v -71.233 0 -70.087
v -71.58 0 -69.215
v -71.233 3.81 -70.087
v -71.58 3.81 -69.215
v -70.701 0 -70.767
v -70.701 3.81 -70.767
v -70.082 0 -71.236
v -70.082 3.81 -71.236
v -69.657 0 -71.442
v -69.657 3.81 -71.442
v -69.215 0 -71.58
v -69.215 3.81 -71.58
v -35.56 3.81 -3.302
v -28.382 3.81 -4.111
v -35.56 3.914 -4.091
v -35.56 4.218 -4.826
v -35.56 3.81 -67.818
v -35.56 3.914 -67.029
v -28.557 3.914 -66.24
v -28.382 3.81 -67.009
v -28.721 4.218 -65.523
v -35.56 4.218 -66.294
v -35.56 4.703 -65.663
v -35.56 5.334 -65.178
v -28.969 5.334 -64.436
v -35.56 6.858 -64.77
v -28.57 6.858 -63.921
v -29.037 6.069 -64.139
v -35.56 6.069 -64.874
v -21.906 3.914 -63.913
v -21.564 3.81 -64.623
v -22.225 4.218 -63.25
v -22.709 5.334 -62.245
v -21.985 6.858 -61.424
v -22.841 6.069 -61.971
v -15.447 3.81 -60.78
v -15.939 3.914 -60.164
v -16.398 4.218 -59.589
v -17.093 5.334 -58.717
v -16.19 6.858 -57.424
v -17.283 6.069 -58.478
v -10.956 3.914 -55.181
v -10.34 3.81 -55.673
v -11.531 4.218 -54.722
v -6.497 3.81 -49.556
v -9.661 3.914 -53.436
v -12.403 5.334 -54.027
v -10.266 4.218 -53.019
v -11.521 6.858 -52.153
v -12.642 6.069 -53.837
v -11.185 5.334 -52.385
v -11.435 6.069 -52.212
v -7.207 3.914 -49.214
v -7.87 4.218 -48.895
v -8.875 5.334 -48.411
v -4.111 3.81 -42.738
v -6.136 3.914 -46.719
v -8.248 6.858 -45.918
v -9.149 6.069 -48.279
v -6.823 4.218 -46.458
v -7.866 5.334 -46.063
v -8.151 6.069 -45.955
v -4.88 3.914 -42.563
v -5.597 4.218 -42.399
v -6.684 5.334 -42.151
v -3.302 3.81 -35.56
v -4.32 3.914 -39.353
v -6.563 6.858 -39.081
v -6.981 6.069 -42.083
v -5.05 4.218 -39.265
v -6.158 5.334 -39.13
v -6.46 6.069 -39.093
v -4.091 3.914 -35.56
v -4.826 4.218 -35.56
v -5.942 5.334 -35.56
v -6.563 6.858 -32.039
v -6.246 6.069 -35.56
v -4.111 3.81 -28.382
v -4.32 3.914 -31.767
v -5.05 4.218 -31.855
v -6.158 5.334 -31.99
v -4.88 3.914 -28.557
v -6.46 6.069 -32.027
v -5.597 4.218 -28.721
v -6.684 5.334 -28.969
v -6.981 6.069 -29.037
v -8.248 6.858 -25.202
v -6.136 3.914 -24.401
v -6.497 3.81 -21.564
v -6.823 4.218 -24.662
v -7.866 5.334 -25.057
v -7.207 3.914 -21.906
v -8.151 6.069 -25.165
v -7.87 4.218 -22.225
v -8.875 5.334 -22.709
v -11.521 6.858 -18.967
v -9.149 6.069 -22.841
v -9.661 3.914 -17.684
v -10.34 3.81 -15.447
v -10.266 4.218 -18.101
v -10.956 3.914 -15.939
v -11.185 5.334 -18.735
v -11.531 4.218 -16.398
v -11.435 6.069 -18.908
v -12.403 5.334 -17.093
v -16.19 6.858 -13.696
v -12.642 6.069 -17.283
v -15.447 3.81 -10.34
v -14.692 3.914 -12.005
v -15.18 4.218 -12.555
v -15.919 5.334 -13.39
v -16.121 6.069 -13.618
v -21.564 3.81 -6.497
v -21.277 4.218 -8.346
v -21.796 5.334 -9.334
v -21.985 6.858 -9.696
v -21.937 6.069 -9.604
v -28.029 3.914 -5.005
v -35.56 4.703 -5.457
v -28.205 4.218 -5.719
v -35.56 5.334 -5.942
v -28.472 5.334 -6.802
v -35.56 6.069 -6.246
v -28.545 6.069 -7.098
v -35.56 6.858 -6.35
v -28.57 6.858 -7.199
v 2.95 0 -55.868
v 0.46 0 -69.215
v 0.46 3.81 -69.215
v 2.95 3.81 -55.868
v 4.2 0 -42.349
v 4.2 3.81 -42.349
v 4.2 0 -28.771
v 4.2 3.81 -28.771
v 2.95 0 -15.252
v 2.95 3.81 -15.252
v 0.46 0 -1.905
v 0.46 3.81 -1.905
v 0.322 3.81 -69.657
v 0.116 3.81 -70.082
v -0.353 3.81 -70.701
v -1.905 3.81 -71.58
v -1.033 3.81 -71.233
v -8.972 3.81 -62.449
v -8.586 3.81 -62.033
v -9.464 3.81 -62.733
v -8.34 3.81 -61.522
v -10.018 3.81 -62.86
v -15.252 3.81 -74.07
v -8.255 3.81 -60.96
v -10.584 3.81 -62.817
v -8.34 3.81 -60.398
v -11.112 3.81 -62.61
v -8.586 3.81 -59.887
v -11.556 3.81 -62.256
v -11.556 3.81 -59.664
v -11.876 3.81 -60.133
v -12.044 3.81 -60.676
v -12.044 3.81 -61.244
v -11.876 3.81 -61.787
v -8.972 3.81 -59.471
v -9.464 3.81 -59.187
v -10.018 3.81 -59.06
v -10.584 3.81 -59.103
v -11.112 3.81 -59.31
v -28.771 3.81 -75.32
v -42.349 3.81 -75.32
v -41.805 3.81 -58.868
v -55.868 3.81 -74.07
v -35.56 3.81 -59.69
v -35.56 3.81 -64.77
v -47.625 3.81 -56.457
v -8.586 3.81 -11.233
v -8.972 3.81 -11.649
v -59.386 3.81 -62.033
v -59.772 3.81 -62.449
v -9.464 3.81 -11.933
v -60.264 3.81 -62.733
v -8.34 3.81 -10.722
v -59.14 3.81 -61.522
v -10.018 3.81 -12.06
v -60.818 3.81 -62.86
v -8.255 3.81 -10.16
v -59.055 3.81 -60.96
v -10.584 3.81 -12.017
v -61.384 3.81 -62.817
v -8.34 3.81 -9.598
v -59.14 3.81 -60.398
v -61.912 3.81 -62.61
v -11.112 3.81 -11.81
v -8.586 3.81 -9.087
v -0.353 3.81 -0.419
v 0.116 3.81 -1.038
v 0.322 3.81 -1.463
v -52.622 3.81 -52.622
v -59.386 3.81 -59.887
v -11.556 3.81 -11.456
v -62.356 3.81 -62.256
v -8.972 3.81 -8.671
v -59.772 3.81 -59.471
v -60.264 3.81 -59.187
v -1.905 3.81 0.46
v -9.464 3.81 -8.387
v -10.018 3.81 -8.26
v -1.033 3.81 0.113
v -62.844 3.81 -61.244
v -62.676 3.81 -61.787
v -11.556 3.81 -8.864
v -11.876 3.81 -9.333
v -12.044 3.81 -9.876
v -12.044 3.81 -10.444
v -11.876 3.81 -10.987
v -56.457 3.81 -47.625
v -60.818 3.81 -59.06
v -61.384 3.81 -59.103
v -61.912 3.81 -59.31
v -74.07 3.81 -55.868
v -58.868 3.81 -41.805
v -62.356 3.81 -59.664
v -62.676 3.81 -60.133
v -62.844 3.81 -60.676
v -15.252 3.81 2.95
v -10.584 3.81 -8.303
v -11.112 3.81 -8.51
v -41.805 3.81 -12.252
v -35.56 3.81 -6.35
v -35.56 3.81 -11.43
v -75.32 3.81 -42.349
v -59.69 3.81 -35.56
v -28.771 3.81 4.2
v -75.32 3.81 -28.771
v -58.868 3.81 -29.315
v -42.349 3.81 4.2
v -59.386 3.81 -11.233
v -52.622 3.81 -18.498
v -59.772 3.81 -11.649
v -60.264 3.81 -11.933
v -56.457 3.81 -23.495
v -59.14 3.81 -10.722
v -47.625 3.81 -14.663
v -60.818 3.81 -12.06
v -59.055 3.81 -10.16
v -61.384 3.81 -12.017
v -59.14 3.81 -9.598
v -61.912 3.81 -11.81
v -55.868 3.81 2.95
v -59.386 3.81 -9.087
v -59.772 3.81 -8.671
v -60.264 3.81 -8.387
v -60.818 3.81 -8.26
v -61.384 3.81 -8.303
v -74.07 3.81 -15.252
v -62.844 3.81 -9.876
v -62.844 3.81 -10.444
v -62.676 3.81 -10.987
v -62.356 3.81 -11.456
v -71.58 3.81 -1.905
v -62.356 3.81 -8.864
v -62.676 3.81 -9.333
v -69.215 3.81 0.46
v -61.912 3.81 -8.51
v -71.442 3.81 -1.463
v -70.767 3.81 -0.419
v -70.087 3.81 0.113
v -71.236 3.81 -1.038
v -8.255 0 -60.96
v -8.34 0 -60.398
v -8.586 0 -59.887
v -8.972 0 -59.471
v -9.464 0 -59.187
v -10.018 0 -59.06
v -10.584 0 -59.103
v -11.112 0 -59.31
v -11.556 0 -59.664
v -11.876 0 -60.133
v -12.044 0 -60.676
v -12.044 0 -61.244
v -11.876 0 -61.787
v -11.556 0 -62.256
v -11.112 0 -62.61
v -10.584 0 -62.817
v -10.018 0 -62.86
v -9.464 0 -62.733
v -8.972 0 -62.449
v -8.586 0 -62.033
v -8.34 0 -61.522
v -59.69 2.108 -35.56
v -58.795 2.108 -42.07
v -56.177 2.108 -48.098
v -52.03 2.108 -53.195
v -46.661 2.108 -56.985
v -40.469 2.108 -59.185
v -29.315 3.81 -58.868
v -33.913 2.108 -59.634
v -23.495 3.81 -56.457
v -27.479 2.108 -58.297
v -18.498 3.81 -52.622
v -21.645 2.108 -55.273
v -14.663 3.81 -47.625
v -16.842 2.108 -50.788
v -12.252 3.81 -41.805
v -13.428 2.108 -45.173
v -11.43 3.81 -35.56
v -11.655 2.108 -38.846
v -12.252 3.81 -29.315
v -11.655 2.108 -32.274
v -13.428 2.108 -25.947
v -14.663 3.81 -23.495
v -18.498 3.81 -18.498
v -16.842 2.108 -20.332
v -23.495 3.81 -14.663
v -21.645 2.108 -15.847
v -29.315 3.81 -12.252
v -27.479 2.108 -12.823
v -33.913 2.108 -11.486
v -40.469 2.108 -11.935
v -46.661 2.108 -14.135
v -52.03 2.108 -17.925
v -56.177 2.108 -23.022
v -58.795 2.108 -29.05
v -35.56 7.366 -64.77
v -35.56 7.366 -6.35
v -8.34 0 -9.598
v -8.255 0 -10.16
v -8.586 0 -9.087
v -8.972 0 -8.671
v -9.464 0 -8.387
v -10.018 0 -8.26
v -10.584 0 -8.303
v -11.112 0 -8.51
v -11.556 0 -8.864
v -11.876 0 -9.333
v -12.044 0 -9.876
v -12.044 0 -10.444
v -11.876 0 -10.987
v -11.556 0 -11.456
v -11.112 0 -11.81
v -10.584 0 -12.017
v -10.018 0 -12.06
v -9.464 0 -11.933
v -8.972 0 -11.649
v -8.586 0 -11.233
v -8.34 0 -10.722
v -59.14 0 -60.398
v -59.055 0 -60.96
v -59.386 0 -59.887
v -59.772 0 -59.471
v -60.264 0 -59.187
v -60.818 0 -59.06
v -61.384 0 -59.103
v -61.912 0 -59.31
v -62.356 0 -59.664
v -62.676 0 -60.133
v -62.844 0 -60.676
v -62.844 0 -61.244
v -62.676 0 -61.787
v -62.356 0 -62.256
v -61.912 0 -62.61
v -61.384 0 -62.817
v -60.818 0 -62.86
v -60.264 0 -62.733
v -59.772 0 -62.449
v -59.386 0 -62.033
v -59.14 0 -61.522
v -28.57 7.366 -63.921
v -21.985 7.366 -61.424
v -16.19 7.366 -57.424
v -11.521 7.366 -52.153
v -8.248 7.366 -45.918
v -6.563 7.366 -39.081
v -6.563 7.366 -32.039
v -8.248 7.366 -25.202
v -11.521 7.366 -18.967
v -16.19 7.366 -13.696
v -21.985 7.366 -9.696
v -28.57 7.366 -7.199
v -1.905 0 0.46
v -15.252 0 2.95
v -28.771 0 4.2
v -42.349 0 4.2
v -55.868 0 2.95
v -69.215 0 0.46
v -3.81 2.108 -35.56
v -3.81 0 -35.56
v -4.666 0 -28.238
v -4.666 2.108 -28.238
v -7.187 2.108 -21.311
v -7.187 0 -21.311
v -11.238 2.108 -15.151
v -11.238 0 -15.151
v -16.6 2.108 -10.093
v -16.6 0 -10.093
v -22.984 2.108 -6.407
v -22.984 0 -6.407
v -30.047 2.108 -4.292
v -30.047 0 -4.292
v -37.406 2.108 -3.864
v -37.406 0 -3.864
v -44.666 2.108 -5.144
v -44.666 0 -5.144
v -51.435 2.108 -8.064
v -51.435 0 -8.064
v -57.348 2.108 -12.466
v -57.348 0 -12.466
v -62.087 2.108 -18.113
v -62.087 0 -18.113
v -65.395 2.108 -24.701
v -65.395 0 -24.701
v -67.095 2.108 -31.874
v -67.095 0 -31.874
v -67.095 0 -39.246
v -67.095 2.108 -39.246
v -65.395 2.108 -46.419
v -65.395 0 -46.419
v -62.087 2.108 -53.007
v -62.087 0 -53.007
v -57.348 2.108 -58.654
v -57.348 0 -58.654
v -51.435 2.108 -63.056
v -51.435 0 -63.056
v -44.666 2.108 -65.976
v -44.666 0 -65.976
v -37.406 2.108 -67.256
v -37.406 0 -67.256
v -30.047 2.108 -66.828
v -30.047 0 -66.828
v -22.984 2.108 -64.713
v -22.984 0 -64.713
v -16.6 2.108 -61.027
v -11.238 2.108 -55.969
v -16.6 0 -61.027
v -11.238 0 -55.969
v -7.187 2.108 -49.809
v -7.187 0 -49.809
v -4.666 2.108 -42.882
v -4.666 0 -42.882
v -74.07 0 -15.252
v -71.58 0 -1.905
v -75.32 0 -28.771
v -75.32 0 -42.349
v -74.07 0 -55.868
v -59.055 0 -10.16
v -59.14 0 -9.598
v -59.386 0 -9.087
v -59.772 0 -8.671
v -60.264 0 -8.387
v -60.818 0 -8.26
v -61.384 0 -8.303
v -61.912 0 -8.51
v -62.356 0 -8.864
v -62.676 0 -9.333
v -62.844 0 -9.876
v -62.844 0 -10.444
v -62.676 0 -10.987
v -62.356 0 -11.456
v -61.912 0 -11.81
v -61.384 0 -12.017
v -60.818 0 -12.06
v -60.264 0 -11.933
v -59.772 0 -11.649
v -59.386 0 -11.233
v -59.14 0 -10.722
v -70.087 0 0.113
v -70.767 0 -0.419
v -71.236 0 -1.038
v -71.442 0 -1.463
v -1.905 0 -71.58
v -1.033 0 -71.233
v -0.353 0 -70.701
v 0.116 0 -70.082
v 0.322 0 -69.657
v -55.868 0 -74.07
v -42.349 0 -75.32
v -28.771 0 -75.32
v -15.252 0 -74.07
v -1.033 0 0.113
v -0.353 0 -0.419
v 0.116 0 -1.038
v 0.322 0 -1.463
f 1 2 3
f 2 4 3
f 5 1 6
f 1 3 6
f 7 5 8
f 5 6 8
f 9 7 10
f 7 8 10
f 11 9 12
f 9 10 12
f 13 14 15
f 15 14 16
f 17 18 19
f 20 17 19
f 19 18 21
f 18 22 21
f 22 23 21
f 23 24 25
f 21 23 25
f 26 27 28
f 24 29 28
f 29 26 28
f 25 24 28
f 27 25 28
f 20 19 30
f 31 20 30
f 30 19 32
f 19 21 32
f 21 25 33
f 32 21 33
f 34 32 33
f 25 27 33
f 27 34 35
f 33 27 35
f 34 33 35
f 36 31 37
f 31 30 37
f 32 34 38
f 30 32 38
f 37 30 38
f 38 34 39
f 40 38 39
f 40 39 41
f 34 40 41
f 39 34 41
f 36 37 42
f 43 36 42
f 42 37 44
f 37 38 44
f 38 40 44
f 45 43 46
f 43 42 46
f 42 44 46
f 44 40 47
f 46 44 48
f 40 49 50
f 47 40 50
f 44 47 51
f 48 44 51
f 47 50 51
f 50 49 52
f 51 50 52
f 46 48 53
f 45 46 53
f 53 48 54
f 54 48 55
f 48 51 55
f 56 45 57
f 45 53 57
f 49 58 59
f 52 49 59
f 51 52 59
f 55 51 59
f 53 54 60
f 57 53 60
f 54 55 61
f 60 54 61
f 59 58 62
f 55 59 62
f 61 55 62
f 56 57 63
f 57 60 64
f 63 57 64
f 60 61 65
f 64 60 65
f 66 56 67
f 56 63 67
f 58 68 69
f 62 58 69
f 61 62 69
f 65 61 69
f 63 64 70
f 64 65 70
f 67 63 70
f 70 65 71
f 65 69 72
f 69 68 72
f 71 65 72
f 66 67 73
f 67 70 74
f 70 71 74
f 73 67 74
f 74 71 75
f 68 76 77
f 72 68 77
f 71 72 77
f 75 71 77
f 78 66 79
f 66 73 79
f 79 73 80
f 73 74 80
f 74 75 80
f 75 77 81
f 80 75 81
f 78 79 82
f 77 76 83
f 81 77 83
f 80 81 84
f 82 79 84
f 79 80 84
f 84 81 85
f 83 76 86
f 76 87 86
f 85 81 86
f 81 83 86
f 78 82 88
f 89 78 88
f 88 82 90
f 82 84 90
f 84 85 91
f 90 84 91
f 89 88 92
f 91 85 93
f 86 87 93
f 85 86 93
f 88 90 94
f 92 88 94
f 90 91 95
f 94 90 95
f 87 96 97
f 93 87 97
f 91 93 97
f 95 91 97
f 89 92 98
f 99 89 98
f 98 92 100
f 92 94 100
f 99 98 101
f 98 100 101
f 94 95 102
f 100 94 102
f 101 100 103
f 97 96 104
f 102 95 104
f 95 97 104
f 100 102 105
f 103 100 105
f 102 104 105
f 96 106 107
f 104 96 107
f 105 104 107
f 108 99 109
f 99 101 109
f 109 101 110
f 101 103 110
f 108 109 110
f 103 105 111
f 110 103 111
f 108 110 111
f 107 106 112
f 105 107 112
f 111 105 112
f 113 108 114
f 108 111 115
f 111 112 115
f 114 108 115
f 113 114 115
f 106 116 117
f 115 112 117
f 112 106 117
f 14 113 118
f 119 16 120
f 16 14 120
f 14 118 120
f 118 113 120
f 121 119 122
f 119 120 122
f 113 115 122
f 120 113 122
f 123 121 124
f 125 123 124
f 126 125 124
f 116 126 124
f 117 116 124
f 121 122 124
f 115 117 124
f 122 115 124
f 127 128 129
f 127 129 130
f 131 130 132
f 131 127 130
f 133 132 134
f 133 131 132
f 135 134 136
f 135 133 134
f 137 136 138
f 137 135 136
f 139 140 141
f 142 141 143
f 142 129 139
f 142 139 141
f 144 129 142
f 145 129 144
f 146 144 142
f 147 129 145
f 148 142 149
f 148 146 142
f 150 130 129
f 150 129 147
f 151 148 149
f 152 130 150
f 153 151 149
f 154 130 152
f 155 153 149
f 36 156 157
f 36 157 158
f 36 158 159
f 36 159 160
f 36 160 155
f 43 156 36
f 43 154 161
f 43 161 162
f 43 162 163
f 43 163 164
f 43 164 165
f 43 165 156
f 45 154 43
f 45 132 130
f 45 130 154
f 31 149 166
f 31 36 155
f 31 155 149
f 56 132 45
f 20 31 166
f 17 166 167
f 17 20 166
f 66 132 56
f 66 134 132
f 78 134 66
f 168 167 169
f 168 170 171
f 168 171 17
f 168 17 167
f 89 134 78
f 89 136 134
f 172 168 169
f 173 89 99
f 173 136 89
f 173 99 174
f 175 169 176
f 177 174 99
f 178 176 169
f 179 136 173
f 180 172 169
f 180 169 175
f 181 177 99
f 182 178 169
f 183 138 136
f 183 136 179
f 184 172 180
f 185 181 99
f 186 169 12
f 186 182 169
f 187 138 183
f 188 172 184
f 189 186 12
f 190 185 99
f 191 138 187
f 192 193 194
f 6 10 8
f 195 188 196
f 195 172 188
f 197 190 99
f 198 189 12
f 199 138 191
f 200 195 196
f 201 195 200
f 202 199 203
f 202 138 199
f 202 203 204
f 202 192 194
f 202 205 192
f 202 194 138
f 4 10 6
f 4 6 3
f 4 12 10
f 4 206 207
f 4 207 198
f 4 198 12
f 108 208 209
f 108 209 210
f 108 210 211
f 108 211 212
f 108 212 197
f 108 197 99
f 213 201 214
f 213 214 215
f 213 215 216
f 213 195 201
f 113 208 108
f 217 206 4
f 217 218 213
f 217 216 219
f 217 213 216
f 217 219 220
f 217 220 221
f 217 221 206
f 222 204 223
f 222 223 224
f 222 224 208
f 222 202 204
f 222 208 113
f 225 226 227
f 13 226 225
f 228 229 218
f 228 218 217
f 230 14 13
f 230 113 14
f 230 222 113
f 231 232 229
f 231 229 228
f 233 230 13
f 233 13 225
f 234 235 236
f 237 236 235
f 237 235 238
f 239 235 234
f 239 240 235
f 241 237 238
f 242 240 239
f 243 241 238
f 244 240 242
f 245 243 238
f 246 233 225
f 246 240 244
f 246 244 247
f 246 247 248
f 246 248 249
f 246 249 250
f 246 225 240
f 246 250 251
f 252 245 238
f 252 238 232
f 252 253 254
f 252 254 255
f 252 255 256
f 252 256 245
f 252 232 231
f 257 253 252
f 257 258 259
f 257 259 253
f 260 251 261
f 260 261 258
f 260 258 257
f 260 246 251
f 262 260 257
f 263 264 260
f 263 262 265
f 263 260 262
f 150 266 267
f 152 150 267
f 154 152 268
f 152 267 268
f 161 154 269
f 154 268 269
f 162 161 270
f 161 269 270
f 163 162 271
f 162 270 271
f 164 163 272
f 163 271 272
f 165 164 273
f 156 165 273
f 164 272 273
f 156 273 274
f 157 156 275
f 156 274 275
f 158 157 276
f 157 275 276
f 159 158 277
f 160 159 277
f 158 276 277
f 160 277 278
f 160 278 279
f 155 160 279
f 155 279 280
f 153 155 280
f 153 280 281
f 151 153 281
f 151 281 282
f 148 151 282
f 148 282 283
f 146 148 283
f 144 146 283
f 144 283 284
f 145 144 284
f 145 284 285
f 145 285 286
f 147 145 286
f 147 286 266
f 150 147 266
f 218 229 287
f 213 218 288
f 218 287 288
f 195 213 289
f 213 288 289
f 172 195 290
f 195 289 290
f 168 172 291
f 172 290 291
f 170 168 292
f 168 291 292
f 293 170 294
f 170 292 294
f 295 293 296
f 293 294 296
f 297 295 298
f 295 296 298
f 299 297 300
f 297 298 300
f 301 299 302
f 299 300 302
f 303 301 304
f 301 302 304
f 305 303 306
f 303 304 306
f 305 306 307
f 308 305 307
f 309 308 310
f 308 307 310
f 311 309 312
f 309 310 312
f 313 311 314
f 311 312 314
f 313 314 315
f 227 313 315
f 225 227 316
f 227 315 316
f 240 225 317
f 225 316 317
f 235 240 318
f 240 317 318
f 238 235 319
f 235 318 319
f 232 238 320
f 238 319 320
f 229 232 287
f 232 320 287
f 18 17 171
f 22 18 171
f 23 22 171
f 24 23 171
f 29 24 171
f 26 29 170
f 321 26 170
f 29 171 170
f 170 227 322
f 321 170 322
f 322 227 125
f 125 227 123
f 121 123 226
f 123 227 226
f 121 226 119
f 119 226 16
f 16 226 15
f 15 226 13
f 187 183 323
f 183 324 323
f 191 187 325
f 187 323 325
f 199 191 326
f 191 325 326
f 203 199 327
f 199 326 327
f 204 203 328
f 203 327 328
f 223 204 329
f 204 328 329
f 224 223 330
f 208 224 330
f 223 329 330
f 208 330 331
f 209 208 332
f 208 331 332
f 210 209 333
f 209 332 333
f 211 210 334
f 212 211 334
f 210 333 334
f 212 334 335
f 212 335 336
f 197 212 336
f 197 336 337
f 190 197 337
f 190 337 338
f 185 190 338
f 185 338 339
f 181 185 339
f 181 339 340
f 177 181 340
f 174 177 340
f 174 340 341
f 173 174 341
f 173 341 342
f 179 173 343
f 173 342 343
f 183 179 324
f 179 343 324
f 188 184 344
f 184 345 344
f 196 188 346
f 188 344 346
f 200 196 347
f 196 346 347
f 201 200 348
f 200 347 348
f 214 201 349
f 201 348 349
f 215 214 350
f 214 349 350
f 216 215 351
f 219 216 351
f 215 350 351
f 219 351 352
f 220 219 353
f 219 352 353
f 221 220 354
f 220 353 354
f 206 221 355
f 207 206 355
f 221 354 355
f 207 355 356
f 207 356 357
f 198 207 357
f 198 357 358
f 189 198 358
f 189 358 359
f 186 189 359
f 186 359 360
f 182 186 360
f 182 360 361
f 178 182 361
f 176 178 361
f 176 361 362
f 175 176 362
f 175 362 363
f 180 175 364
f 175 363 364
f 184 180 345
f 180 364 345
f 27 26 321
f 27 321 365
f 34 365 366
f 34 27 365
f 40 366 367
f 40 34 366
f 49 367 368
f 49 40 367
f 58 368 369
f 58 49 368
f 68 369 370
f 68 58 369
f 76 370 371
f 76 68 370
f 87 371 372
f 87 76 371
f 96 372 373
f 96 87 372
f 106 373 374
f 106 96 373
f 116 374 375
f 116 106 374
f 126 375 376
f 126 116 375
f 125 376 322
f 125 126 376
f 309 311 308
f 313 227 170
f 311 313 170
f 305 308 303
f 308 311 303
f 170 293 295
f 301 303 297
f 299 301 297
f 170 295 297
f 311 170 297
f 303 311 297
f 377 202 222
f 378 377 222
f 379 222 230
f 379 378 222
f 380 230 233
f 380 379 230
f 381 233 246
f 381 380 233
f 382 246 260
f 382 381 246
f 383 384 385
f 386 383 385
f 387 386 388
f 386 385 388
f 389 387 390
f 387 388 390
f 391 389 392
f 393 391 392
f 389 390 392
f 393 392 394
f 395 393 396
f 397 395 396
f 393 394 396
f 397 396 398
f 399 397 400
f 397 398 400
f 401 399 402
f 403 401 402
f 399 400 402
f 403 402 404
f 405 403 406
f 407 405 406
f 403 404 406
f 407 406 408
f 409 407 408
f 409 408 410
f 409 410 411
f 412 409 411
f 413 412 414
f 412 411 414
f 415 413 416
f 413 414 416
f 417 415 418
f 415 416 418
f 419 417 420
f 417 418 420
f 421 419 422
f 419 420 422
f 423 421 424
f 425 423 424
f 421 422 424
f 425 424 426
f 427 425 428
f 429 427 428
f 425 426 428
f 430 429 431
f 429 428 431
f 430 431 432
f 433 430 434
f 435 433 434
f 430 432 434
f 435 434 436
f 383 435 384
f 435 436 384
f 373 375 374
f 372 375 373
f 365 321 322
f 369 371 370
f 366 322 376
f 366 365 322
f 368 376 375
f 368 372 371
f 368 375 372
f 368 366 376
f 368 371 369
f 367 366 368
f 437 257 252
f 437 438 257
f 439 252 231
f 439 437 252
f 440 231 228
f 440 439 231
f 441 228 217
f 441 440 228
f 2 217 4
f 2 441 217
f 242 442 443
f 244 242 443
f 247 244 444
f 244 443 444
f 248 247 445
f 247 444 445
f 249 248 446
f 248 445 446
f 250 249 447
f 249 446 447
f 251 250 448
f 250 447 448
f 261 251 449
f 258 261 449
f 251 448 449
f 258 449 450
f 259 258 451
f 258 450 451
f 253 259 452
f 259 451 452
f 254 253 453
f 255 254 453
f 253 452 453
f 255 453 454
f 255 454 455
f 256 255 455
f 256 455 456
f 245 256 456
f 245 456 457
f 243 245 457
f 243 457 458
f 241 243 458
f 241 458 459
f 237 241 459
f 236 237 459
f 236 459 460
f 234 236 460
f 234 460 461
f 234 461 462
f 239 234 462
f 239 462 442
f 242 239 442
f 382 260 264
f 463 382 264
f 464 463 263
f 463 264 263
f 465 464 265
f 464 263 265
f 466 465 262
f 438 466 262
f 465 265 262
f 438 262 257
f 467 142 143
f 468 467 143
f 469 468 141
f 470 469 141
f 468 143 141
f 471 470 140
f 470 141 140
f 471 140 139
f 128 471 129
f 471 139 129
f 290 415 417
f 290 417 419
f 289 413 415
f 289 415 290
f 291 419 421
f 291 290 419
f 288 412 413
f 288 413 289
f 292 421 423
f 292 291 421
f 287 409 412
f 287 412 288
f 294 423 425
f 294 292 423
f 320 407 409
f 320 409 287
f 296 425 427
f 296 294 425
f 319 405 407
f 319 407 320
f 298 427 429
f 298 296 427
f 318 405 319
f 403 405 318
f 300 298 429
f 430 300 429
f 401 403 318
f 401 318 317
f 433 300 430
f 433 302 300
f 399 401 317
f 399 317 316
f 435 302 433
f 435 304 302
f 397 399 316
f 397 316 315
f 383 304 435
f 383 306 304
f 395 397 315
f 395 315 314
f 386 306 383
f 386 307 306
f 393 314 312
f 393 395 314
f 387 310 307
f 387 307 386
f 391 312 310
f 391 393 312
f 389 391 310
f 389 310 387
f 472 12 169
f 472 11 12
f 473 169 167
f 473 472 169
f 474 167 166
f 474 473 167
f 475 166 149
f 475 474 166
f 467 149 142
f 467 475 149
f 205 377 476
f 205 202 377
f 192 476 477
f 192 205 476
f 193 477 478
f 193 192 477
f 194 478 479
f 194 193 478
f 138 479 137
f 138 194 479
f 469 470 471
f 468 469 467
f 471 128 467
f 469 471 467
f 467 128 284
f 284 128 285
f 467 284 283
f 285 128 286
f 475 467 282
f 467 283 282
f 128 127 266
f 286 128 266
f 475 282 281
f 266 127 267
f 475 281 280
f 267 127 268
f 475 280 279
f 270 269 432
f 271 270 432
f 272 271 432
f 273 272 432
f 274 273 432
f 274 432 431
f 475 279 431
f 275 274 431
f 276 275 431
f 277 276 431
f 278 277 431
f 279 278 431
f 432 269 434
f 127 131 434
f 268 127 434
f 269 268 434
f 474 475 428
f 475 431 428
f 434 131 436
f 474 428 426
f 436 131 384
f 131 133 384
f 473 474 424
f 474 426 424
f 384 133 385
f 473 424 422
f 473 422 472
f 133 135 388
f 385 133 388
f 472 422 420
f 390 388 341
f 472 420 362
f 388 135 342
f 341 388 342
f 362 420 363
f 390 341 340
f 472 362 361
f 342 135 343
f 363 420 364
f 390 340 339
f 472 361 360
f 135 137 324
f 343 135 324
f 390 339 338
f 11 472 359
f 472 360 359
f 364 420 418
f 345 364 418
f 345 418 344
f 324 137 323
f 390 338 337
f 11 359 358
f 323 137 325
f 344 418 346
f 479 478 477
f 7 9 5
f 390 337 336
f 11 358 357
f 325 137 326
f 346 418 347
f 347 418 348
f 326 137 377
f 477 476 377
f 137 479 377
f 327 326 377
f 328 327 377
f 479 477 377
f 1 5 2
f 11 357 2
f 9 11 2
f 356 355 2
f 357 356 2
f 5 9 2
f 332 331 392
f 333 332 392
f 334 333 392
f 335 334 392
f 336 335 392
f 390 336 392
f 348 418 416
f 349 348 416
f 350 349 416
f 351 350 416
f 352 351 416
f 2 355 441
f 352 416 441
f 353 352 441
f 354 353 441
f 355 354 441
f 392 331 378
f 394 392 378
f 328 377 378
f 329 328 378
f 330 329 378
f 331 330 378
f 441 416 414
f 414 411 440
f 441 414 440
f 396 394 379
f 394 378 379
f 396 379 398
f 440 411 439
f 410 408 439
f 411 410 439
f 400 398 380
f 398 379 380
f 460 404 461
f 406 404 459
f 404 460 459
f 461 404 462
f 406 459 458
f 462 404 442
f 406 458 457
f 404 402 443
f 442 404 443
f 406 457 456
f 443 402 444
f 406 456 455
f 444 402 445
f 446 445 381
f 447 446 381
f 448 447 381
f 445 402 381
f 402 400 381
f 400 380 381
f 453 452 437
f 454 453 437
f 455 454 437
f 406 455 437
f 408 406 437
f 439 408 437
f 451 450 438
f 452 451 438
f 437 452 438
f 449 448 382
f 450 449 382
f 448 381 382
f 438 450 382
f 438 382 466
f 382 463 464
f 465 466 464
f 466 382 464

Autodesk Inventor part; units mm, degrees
ref_plane "YZ Plane" through (0, 0, 0) normal (1, 0, 0) x (0, 1, 0)
ref_plane "XZ Plane" through (0, 0, 0) normal (0, 1, 0) x (-1, 0, 0)
ref_plane "XY Plane" through (0, 0, 0) normal (0, 0, 1) x (1, 0, 0)
sketch "Sketch1" plane through (0, 0, 0) normal (0, 1, 0) x (-1, 0, 0)
  line L0 (0, 0) -> (0, -71.12)
  line L1 (0, -71.12) -> (71.12, -71.12)
  line L2 (71.12, -71.12) -> (71.12, 0)
  line L3 (71.12, 0) -> (0, 0)
  arc A0 (71.12, -71.12) -> (71.12, 0) centre (-71.8439, -35.56) ccw
  arc A1 (0, 0) -> (0, -71.12) centre (142.9639, -35.56) ccw
  arc A2 (0, -71.12) -> (71.12, -71.12) centre (35.56, 71.8439) ccw
  arc A3 (71.12, 0) -> (0, 0) centre (35.56, -142.9639) ccw
  circle A4 centre (35.56, -35.56) radius 24.13
  dimension "d9" = 71.12
  dimension "d10" = 71.12
  dimension "d14" = 147.32
  dimension "d17" = 48.26
  dimension "d18" = 35.56
  dimension "d19" = 35.56
extrude "Extrusion1" add sketch "Sketch1" along normal blind 3.81
fillet "Fillet1" radius 3.175 4 edges at (0, 1.905, 0) (0, 1.905, -71.12) (-71.12, 1.905, 0) (-71.12, 1.905, -71.12)
sketch "Sketch2" plane through (0, 3.81, 0) normal (0, 1, 0) x (1, 0, 0)
  point P0 (0, 0)
sketch "Sketch3" plane through (0, 0, 0) normal (0, -1, 0) x (1, 0, 0)
  circle A0 centre (-35.56, -35.56) radius 24.13 projected
  circle A1 centre (-35.56, -35.56) radius 31.75
  circle A2 centre (-35.56, -35.56) radius 24.13
  point P0 (0, 0)
  dimension "d23" = 63.5
extrude "Extrusion2" cut sketch "Sketch3" against normal blind 2.1079
sketch "Sketch4" plane through (0, 0, 0) normal (0, -1, 0) x (1, 0, 0)
  circle A0 centre (-35.56, -35.56) radius 24.13 projected
  circle A1 centre (-35.56, -35.56) radius 31.75 projected
  circle A2 centre (-60.96, -10.16) radius 1.905
  arc A3 (-1.9053, 0.4605) -> (-69.2147, 0.4605) centre (-35.56, -142.9639) ccw construction
  line L0 (-35.56, 4.3561) -> (-35.56, -75.4761) construction
  arc A4 (-69.2147, -71.5805) -> (-1.9053, -71.5805) centre (-35.56, 71.8439) ccw construction
  arc A5 (-71.5805, -1.9053) -> (-71.5805, -69.2147) centre (71.8439, -35.56) ccw construction
  line L1 (-75.4761, -35.56) -> (4.3561, -35.56) construction
  arc A6 (0.4605, -69.2147) -> (0.4605, -1.9053) centre (-142.9639, -35.56) ccw construction
  line L2 (-75.4761, -35.56) -> (-75.4761, 1.4435) construction
  circle A7 centre (-10.16, -10.16) radius 1.905
  line L3 (4.3561, -35.56) -> (4.3561, 1.4435) construction
  circle A8 centre (-60.96, -60.96) radius 1.905
  circle A9 centre (-10.16, -60.96) radius 1.905
  point P0 (0, 0)
  dimension "d26" = 3.81
  dimension "d34" = 25.4
  dimension "d35" = 25.4
  dimension "d36" = 14.5161
  dimension "d37" = 14.5162
  dimension "d38" = 50.8
  dimension "d39" = 50.8
extrude "Extrusion3" cut sketch "Sketch4" against normal blind 25.4 contours A2 | A7 | A8 | A9
sketch "Sketch6" plane through (0, 0, 0) normal (0, -1, 0) x (1, 0, 0)
  point P0 (0, 0)
sketch "Sketch8" plane through (0, 3.81, 0) normal (0, 1, 0) x (1, 0, 0)
  circle A0 centre (-35.56, 35.56) radius 24.13 projected
  circle A1 centre (-35.56, 35.56) radius 24.13 construction
  line L0 (-35.56, 59.69) -> (-35.56, 64.77) construction
  line L1 (-35.56, 11.43) -> (-35.56, 6.35) construction
  line L2 (-11.43, 35.56) -> (-6.35, 35.56) construction
  arc A2 (-35.56, 6.35) -> (-35.56, 64.77) centre (-35.56, 35.56) ccw
  line L3 (-35.56, 64.77) -> (-35.56, 6.35)
  point P0 (0, 0)
  dimension "d44" = 5.08
  dimension "d45" = 5.08
  dimension "d46" = 5.08
extrude "Extrusion5" add sketch "Sketch8" along normal blind 3.556 contours A0 L3 | A0 L3 A2 picked at (-27.7183, 37.3498)
fillet "Fillet2" radius 3.048 1 edges at (-6.35, 3.81, -35.56)
properties part number "_3DPrint"
